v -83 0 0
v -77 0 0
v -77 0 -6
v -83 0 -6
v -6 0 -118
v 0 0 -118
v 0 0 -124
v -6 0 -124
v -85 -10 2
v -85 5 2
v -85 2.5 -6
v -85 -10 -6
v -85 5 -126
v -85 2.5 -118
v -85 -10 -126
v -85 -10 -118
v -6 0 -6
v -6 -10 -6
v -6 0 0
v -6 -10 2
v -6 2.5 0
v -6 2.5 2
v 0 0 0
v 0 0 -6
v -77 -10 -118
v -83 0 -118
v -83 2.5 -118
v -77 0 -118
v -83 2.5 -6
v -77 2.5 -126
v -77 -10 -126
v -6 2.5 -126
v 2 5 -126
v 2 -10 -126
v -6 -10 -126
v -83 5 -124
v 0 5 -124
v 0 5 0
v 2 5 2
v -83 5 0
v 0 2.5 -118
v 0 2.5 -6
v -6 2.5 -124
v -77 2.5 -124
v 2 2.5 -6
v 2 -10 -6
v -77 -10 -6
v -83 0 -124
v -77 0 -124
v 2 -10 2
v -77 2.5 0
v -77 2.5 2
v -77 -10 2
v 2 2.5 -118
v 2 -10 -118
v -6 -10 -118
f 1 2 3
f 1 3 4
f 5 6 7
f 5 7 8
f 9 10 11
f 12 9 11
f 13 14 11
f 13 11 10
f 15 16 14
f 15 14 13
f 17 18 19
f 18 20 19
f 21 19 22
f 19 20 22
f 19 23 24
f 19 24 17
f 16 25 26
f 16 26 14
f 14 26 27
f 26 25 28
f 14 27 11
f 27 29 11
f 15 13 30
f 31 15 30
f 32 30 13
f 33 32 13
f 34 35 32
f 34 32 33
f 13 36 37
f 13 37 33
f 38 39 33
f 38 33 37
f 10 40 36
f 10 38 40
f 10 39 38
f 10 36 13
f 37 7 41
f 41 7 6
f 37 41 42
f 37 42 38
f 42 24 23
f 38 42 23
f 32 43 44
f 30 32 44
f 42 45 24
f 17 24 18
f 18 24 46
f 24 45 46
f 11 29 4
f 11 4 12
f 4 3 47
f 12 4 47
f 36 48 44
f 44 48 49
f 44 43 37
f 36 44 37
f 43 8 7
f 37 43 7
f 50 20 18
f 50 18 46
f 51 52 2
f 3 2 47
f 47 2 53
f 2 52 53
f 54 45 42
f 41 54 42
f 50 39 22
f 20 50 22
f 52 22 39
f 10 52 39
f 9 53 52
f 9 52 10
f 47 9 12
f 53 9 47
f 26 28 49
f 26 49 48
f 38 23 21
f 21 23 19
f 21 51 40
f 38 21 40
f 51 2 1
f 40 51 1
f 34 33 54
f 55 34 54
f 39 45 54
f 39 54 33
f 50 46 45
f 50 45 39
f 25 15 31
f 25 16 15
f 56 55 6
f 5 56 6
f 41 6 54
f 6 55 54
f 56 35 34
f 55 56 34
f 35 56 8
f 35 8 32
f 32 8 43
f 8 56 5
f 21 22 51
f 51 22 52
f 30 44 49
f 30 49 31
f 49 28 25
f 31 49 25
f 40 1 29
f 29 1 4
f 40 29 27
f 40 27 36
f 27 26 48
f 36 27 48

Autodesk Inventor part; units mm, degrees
ref_plane "YZ Plane" through (0, 0, 0) normal (1, 0, 0) x (0, 1, 0)
ref_plane "XZ Plane" through (0, 0, 0) normal (0, 1, 0) x (-1, 0, 0)
ref_plane "XY Plane" through (0, 0, 0) normal (0, 0, 1) x (1, 0, 0)
sketch "草图1" plane through (0, 0, 0) normal (0, 1, 0) x (-1, 0, 0)
  line L0 (0, 0) -> (83, 0)
  line L1 (83, 0) -> (83, -124)
  line L2 (83, -124) -> (0, -124)
  line L3 (0, -124) -> (0, 0)
  line L4 (-2, 2) -> (85, 2)
  line L5 (85, 2) -> (85, -126)
  line L6 (85, -126) -> (-2, -126)
  line L7 (-2, -126) -> (-2, 2)
  dimension "d0" = 83
  dimension "d1" = 124
  dimension "d2" = 2
  dimension "d3" = 2
  dimension "d4" = 2
extrude "拉伸1" add sketch "草图1" along normal blind 5 contours L0 L1 L2 L3 | L4 L5 L6 L7
sketch "草图2" plane through (-85, 0, 2) normal (0, 0, 1) x (1, 0, 0)
  line L0 (0, 0) -> (87, 0) projected
  line L1 (87, 0) -> (87, 5) projected
  line L2 (0, 5) -> (87, 5) projected
  line L3 (0, 0) -> (0, 5) projected
  line L4 (85, 0) -> (2, 0) projected
  line L5 (8, 0) -> (79, 0)
  line L6 (79, 0) -> (79, 2.5)
  line L7 (79, 2.5) -> (8, 2.5)
  line L8 (8, 2.5) -> (8, 0)
  point P0 (79, 1.25)
  dimension "d8" = 8
  dimension "d9" = 8
extrude "拉伸2" cut sketch "草图2" against normal through all contours L8 L7 L6 L0
sketch "草图3" plane through (2, 0, 2) normal (1, 0, 0) x (0, 0, -1)
  line L0 (2, 0) -> (126, 0) projected
  line L1 (8, 0) -> (120, 0)
  line L2 (120, 0) -> (120, 2.5)
  line L3 (120, 2.5) -> (8, 2.5)
  line L4 (8, 2.5) -> (8, 0)
  line L5 (0, 0) -> (0, 5) projected
  line L6 (128, 0) -> (128, 5) projected
  line L7 (0, 5) -> (128, 5) projected
  point P0 (8, 1.25)
  point P1 (120, 1.25)
  dimension "d12" = 8
  dimension "d13" = 8
  dimension "d14" = 2.5
extrude "拉伸3" cut sketch "草图3" against normal through all
sketch "草图4" plane through (0, 0, 0) normal (0, -1, 0) x (1, 0, 0)
  line L0 (-6, -6) -> (2, -6) projected
  line L1 (2, 2) -> (2, -6) projected
  line L2 (-6, 2) -> (2, 2) projected
  line L3 (-6, 2) -> (-6, -6) projected
  line L4 (-6, -6) -> (2, -6) projected
  line L5 (-77, -126) -> (-77, -118) projected
  line L6 (-85, 2) -> (-77, 2) projected
  line L7 (-85, -6) -> (-85, 2) projected
  line L8 (2, -118) -> (-6, -118) projected
  line L9 (-85, -126) -> (-85, -118) projected
  line L10 (-77, -126) -> (-85, -126) projected
  line L11 (-77, -126) -> (-77, -118) projected
  line L12 (2, -118) -> (-6, -118) projected
  line L13 (-6, 2) -> (-6, -6) projected
  line L14 (2, -126) -> (-6, -126) projected
  line L15 (2, -118) -> (2, -126) projected
  line L16 (-6, -118) -> (-6, -126) projected
  line L17 (-77, -118) -> (-85, -118) projected
  line L18 (-85, -126) -> (-85, -118) projected
  line L19 (-77, -126) -> (-85, -126) projected
  line L20 (-77, -126) -> (-77, -118) projected
  line L21 (-6, -6) -> (2, -6) projected
  line L22 (2, 2) -> (2, -6) projected
  line L23 (-6, 2) -> (2, 2) projected
  line L24 (-6, -6) -> (2, -6) projected
  line L25 (-85, 2) -> (-77, 2) projected
  line L26 (-85, -6) -> (-85, 2) projected
  line L27 (-6, 2) -> (-6, -6) projected
  line L28 (2, -126) -> (-6, -126) projected
  line L29 (2, -118) -> (2, -126) projected
  line L30 (-77, -118) -> (-85, -118) projected
  line L31 (-77, -6) -> (-77, 2) projected
  line L32 (-85, -6) -> (-77, -6) projected
  line L33 (2, -118) -> (-6, -118) projected
  line L34 (-85, -126) -> (-85, -118) projected
  line L35 (-77, -126) -> (-85, -126) projected
  line L36 (-77, -6) -> (-77, 2) projected
  line L37 (2, 2) -> (2, -6) projected
  line L38 (-6, 2) -> (2, 2) projected
  line L39 (-6, 2) -> (-6, -6) projected
  line L40 (-85, -6) -> (-77, -6) projected
  line L41 (-77, -126) -> (-77, -118) projected
  line L42 (-85, 2) -> (-77, 2) projected
  line L43 (-85, -6) -> (-85, 2) projected
  line L44 (2, -118) -> (-6, -118) projected
  line L45 (-6, -118) -> (-6, -126) projected
  line L46 (2, -126) -> (-6, -126) projected
  line L47 (2, -118) -> (2, -126) projected
  line L48 (-85, -6) -> (-77, -6) projected
  line L49 (-77, -6) -> (-77, 2) projected
  line L50 (-85, 2) -> (-77, 2) projected
  line L51 (-85, -6) -> (-85, 2) projected
  line L52 (2, 2) -> (2, -6) projected
  line L53 (-6, 2) -> (2, 2) projected
  line L54 (-85, -6) -> (-77, -6) projected
  line L55 (-6, -118) -> (-6, -126) projected
  line L56 (-77, -118) -> (-85, -118) projected
  line L57 (-6, -118) -> (-6, -126) projected
  line L58 (2, -126) -> (-6, -126) projected
  line L59 (2, -118) -> (2, -126) projected
  line L60 (-77, -6) -> (-77, 2) projected
  line L61 (-77, -118) -> (-85, -118) projected
  line L62 (-85, -126) -> (-85, -118) projected
  line L63 (-77, -126) -> (-85, -126) projected
  point P0 (0, 0)
extrude "拉伸4" add sketch "草图4" along normal blind 10
extrude "拉伸5" cut sketch "草图1" along normal blind 43 contours L0 L1 L2 L3
properties part number "底座"
